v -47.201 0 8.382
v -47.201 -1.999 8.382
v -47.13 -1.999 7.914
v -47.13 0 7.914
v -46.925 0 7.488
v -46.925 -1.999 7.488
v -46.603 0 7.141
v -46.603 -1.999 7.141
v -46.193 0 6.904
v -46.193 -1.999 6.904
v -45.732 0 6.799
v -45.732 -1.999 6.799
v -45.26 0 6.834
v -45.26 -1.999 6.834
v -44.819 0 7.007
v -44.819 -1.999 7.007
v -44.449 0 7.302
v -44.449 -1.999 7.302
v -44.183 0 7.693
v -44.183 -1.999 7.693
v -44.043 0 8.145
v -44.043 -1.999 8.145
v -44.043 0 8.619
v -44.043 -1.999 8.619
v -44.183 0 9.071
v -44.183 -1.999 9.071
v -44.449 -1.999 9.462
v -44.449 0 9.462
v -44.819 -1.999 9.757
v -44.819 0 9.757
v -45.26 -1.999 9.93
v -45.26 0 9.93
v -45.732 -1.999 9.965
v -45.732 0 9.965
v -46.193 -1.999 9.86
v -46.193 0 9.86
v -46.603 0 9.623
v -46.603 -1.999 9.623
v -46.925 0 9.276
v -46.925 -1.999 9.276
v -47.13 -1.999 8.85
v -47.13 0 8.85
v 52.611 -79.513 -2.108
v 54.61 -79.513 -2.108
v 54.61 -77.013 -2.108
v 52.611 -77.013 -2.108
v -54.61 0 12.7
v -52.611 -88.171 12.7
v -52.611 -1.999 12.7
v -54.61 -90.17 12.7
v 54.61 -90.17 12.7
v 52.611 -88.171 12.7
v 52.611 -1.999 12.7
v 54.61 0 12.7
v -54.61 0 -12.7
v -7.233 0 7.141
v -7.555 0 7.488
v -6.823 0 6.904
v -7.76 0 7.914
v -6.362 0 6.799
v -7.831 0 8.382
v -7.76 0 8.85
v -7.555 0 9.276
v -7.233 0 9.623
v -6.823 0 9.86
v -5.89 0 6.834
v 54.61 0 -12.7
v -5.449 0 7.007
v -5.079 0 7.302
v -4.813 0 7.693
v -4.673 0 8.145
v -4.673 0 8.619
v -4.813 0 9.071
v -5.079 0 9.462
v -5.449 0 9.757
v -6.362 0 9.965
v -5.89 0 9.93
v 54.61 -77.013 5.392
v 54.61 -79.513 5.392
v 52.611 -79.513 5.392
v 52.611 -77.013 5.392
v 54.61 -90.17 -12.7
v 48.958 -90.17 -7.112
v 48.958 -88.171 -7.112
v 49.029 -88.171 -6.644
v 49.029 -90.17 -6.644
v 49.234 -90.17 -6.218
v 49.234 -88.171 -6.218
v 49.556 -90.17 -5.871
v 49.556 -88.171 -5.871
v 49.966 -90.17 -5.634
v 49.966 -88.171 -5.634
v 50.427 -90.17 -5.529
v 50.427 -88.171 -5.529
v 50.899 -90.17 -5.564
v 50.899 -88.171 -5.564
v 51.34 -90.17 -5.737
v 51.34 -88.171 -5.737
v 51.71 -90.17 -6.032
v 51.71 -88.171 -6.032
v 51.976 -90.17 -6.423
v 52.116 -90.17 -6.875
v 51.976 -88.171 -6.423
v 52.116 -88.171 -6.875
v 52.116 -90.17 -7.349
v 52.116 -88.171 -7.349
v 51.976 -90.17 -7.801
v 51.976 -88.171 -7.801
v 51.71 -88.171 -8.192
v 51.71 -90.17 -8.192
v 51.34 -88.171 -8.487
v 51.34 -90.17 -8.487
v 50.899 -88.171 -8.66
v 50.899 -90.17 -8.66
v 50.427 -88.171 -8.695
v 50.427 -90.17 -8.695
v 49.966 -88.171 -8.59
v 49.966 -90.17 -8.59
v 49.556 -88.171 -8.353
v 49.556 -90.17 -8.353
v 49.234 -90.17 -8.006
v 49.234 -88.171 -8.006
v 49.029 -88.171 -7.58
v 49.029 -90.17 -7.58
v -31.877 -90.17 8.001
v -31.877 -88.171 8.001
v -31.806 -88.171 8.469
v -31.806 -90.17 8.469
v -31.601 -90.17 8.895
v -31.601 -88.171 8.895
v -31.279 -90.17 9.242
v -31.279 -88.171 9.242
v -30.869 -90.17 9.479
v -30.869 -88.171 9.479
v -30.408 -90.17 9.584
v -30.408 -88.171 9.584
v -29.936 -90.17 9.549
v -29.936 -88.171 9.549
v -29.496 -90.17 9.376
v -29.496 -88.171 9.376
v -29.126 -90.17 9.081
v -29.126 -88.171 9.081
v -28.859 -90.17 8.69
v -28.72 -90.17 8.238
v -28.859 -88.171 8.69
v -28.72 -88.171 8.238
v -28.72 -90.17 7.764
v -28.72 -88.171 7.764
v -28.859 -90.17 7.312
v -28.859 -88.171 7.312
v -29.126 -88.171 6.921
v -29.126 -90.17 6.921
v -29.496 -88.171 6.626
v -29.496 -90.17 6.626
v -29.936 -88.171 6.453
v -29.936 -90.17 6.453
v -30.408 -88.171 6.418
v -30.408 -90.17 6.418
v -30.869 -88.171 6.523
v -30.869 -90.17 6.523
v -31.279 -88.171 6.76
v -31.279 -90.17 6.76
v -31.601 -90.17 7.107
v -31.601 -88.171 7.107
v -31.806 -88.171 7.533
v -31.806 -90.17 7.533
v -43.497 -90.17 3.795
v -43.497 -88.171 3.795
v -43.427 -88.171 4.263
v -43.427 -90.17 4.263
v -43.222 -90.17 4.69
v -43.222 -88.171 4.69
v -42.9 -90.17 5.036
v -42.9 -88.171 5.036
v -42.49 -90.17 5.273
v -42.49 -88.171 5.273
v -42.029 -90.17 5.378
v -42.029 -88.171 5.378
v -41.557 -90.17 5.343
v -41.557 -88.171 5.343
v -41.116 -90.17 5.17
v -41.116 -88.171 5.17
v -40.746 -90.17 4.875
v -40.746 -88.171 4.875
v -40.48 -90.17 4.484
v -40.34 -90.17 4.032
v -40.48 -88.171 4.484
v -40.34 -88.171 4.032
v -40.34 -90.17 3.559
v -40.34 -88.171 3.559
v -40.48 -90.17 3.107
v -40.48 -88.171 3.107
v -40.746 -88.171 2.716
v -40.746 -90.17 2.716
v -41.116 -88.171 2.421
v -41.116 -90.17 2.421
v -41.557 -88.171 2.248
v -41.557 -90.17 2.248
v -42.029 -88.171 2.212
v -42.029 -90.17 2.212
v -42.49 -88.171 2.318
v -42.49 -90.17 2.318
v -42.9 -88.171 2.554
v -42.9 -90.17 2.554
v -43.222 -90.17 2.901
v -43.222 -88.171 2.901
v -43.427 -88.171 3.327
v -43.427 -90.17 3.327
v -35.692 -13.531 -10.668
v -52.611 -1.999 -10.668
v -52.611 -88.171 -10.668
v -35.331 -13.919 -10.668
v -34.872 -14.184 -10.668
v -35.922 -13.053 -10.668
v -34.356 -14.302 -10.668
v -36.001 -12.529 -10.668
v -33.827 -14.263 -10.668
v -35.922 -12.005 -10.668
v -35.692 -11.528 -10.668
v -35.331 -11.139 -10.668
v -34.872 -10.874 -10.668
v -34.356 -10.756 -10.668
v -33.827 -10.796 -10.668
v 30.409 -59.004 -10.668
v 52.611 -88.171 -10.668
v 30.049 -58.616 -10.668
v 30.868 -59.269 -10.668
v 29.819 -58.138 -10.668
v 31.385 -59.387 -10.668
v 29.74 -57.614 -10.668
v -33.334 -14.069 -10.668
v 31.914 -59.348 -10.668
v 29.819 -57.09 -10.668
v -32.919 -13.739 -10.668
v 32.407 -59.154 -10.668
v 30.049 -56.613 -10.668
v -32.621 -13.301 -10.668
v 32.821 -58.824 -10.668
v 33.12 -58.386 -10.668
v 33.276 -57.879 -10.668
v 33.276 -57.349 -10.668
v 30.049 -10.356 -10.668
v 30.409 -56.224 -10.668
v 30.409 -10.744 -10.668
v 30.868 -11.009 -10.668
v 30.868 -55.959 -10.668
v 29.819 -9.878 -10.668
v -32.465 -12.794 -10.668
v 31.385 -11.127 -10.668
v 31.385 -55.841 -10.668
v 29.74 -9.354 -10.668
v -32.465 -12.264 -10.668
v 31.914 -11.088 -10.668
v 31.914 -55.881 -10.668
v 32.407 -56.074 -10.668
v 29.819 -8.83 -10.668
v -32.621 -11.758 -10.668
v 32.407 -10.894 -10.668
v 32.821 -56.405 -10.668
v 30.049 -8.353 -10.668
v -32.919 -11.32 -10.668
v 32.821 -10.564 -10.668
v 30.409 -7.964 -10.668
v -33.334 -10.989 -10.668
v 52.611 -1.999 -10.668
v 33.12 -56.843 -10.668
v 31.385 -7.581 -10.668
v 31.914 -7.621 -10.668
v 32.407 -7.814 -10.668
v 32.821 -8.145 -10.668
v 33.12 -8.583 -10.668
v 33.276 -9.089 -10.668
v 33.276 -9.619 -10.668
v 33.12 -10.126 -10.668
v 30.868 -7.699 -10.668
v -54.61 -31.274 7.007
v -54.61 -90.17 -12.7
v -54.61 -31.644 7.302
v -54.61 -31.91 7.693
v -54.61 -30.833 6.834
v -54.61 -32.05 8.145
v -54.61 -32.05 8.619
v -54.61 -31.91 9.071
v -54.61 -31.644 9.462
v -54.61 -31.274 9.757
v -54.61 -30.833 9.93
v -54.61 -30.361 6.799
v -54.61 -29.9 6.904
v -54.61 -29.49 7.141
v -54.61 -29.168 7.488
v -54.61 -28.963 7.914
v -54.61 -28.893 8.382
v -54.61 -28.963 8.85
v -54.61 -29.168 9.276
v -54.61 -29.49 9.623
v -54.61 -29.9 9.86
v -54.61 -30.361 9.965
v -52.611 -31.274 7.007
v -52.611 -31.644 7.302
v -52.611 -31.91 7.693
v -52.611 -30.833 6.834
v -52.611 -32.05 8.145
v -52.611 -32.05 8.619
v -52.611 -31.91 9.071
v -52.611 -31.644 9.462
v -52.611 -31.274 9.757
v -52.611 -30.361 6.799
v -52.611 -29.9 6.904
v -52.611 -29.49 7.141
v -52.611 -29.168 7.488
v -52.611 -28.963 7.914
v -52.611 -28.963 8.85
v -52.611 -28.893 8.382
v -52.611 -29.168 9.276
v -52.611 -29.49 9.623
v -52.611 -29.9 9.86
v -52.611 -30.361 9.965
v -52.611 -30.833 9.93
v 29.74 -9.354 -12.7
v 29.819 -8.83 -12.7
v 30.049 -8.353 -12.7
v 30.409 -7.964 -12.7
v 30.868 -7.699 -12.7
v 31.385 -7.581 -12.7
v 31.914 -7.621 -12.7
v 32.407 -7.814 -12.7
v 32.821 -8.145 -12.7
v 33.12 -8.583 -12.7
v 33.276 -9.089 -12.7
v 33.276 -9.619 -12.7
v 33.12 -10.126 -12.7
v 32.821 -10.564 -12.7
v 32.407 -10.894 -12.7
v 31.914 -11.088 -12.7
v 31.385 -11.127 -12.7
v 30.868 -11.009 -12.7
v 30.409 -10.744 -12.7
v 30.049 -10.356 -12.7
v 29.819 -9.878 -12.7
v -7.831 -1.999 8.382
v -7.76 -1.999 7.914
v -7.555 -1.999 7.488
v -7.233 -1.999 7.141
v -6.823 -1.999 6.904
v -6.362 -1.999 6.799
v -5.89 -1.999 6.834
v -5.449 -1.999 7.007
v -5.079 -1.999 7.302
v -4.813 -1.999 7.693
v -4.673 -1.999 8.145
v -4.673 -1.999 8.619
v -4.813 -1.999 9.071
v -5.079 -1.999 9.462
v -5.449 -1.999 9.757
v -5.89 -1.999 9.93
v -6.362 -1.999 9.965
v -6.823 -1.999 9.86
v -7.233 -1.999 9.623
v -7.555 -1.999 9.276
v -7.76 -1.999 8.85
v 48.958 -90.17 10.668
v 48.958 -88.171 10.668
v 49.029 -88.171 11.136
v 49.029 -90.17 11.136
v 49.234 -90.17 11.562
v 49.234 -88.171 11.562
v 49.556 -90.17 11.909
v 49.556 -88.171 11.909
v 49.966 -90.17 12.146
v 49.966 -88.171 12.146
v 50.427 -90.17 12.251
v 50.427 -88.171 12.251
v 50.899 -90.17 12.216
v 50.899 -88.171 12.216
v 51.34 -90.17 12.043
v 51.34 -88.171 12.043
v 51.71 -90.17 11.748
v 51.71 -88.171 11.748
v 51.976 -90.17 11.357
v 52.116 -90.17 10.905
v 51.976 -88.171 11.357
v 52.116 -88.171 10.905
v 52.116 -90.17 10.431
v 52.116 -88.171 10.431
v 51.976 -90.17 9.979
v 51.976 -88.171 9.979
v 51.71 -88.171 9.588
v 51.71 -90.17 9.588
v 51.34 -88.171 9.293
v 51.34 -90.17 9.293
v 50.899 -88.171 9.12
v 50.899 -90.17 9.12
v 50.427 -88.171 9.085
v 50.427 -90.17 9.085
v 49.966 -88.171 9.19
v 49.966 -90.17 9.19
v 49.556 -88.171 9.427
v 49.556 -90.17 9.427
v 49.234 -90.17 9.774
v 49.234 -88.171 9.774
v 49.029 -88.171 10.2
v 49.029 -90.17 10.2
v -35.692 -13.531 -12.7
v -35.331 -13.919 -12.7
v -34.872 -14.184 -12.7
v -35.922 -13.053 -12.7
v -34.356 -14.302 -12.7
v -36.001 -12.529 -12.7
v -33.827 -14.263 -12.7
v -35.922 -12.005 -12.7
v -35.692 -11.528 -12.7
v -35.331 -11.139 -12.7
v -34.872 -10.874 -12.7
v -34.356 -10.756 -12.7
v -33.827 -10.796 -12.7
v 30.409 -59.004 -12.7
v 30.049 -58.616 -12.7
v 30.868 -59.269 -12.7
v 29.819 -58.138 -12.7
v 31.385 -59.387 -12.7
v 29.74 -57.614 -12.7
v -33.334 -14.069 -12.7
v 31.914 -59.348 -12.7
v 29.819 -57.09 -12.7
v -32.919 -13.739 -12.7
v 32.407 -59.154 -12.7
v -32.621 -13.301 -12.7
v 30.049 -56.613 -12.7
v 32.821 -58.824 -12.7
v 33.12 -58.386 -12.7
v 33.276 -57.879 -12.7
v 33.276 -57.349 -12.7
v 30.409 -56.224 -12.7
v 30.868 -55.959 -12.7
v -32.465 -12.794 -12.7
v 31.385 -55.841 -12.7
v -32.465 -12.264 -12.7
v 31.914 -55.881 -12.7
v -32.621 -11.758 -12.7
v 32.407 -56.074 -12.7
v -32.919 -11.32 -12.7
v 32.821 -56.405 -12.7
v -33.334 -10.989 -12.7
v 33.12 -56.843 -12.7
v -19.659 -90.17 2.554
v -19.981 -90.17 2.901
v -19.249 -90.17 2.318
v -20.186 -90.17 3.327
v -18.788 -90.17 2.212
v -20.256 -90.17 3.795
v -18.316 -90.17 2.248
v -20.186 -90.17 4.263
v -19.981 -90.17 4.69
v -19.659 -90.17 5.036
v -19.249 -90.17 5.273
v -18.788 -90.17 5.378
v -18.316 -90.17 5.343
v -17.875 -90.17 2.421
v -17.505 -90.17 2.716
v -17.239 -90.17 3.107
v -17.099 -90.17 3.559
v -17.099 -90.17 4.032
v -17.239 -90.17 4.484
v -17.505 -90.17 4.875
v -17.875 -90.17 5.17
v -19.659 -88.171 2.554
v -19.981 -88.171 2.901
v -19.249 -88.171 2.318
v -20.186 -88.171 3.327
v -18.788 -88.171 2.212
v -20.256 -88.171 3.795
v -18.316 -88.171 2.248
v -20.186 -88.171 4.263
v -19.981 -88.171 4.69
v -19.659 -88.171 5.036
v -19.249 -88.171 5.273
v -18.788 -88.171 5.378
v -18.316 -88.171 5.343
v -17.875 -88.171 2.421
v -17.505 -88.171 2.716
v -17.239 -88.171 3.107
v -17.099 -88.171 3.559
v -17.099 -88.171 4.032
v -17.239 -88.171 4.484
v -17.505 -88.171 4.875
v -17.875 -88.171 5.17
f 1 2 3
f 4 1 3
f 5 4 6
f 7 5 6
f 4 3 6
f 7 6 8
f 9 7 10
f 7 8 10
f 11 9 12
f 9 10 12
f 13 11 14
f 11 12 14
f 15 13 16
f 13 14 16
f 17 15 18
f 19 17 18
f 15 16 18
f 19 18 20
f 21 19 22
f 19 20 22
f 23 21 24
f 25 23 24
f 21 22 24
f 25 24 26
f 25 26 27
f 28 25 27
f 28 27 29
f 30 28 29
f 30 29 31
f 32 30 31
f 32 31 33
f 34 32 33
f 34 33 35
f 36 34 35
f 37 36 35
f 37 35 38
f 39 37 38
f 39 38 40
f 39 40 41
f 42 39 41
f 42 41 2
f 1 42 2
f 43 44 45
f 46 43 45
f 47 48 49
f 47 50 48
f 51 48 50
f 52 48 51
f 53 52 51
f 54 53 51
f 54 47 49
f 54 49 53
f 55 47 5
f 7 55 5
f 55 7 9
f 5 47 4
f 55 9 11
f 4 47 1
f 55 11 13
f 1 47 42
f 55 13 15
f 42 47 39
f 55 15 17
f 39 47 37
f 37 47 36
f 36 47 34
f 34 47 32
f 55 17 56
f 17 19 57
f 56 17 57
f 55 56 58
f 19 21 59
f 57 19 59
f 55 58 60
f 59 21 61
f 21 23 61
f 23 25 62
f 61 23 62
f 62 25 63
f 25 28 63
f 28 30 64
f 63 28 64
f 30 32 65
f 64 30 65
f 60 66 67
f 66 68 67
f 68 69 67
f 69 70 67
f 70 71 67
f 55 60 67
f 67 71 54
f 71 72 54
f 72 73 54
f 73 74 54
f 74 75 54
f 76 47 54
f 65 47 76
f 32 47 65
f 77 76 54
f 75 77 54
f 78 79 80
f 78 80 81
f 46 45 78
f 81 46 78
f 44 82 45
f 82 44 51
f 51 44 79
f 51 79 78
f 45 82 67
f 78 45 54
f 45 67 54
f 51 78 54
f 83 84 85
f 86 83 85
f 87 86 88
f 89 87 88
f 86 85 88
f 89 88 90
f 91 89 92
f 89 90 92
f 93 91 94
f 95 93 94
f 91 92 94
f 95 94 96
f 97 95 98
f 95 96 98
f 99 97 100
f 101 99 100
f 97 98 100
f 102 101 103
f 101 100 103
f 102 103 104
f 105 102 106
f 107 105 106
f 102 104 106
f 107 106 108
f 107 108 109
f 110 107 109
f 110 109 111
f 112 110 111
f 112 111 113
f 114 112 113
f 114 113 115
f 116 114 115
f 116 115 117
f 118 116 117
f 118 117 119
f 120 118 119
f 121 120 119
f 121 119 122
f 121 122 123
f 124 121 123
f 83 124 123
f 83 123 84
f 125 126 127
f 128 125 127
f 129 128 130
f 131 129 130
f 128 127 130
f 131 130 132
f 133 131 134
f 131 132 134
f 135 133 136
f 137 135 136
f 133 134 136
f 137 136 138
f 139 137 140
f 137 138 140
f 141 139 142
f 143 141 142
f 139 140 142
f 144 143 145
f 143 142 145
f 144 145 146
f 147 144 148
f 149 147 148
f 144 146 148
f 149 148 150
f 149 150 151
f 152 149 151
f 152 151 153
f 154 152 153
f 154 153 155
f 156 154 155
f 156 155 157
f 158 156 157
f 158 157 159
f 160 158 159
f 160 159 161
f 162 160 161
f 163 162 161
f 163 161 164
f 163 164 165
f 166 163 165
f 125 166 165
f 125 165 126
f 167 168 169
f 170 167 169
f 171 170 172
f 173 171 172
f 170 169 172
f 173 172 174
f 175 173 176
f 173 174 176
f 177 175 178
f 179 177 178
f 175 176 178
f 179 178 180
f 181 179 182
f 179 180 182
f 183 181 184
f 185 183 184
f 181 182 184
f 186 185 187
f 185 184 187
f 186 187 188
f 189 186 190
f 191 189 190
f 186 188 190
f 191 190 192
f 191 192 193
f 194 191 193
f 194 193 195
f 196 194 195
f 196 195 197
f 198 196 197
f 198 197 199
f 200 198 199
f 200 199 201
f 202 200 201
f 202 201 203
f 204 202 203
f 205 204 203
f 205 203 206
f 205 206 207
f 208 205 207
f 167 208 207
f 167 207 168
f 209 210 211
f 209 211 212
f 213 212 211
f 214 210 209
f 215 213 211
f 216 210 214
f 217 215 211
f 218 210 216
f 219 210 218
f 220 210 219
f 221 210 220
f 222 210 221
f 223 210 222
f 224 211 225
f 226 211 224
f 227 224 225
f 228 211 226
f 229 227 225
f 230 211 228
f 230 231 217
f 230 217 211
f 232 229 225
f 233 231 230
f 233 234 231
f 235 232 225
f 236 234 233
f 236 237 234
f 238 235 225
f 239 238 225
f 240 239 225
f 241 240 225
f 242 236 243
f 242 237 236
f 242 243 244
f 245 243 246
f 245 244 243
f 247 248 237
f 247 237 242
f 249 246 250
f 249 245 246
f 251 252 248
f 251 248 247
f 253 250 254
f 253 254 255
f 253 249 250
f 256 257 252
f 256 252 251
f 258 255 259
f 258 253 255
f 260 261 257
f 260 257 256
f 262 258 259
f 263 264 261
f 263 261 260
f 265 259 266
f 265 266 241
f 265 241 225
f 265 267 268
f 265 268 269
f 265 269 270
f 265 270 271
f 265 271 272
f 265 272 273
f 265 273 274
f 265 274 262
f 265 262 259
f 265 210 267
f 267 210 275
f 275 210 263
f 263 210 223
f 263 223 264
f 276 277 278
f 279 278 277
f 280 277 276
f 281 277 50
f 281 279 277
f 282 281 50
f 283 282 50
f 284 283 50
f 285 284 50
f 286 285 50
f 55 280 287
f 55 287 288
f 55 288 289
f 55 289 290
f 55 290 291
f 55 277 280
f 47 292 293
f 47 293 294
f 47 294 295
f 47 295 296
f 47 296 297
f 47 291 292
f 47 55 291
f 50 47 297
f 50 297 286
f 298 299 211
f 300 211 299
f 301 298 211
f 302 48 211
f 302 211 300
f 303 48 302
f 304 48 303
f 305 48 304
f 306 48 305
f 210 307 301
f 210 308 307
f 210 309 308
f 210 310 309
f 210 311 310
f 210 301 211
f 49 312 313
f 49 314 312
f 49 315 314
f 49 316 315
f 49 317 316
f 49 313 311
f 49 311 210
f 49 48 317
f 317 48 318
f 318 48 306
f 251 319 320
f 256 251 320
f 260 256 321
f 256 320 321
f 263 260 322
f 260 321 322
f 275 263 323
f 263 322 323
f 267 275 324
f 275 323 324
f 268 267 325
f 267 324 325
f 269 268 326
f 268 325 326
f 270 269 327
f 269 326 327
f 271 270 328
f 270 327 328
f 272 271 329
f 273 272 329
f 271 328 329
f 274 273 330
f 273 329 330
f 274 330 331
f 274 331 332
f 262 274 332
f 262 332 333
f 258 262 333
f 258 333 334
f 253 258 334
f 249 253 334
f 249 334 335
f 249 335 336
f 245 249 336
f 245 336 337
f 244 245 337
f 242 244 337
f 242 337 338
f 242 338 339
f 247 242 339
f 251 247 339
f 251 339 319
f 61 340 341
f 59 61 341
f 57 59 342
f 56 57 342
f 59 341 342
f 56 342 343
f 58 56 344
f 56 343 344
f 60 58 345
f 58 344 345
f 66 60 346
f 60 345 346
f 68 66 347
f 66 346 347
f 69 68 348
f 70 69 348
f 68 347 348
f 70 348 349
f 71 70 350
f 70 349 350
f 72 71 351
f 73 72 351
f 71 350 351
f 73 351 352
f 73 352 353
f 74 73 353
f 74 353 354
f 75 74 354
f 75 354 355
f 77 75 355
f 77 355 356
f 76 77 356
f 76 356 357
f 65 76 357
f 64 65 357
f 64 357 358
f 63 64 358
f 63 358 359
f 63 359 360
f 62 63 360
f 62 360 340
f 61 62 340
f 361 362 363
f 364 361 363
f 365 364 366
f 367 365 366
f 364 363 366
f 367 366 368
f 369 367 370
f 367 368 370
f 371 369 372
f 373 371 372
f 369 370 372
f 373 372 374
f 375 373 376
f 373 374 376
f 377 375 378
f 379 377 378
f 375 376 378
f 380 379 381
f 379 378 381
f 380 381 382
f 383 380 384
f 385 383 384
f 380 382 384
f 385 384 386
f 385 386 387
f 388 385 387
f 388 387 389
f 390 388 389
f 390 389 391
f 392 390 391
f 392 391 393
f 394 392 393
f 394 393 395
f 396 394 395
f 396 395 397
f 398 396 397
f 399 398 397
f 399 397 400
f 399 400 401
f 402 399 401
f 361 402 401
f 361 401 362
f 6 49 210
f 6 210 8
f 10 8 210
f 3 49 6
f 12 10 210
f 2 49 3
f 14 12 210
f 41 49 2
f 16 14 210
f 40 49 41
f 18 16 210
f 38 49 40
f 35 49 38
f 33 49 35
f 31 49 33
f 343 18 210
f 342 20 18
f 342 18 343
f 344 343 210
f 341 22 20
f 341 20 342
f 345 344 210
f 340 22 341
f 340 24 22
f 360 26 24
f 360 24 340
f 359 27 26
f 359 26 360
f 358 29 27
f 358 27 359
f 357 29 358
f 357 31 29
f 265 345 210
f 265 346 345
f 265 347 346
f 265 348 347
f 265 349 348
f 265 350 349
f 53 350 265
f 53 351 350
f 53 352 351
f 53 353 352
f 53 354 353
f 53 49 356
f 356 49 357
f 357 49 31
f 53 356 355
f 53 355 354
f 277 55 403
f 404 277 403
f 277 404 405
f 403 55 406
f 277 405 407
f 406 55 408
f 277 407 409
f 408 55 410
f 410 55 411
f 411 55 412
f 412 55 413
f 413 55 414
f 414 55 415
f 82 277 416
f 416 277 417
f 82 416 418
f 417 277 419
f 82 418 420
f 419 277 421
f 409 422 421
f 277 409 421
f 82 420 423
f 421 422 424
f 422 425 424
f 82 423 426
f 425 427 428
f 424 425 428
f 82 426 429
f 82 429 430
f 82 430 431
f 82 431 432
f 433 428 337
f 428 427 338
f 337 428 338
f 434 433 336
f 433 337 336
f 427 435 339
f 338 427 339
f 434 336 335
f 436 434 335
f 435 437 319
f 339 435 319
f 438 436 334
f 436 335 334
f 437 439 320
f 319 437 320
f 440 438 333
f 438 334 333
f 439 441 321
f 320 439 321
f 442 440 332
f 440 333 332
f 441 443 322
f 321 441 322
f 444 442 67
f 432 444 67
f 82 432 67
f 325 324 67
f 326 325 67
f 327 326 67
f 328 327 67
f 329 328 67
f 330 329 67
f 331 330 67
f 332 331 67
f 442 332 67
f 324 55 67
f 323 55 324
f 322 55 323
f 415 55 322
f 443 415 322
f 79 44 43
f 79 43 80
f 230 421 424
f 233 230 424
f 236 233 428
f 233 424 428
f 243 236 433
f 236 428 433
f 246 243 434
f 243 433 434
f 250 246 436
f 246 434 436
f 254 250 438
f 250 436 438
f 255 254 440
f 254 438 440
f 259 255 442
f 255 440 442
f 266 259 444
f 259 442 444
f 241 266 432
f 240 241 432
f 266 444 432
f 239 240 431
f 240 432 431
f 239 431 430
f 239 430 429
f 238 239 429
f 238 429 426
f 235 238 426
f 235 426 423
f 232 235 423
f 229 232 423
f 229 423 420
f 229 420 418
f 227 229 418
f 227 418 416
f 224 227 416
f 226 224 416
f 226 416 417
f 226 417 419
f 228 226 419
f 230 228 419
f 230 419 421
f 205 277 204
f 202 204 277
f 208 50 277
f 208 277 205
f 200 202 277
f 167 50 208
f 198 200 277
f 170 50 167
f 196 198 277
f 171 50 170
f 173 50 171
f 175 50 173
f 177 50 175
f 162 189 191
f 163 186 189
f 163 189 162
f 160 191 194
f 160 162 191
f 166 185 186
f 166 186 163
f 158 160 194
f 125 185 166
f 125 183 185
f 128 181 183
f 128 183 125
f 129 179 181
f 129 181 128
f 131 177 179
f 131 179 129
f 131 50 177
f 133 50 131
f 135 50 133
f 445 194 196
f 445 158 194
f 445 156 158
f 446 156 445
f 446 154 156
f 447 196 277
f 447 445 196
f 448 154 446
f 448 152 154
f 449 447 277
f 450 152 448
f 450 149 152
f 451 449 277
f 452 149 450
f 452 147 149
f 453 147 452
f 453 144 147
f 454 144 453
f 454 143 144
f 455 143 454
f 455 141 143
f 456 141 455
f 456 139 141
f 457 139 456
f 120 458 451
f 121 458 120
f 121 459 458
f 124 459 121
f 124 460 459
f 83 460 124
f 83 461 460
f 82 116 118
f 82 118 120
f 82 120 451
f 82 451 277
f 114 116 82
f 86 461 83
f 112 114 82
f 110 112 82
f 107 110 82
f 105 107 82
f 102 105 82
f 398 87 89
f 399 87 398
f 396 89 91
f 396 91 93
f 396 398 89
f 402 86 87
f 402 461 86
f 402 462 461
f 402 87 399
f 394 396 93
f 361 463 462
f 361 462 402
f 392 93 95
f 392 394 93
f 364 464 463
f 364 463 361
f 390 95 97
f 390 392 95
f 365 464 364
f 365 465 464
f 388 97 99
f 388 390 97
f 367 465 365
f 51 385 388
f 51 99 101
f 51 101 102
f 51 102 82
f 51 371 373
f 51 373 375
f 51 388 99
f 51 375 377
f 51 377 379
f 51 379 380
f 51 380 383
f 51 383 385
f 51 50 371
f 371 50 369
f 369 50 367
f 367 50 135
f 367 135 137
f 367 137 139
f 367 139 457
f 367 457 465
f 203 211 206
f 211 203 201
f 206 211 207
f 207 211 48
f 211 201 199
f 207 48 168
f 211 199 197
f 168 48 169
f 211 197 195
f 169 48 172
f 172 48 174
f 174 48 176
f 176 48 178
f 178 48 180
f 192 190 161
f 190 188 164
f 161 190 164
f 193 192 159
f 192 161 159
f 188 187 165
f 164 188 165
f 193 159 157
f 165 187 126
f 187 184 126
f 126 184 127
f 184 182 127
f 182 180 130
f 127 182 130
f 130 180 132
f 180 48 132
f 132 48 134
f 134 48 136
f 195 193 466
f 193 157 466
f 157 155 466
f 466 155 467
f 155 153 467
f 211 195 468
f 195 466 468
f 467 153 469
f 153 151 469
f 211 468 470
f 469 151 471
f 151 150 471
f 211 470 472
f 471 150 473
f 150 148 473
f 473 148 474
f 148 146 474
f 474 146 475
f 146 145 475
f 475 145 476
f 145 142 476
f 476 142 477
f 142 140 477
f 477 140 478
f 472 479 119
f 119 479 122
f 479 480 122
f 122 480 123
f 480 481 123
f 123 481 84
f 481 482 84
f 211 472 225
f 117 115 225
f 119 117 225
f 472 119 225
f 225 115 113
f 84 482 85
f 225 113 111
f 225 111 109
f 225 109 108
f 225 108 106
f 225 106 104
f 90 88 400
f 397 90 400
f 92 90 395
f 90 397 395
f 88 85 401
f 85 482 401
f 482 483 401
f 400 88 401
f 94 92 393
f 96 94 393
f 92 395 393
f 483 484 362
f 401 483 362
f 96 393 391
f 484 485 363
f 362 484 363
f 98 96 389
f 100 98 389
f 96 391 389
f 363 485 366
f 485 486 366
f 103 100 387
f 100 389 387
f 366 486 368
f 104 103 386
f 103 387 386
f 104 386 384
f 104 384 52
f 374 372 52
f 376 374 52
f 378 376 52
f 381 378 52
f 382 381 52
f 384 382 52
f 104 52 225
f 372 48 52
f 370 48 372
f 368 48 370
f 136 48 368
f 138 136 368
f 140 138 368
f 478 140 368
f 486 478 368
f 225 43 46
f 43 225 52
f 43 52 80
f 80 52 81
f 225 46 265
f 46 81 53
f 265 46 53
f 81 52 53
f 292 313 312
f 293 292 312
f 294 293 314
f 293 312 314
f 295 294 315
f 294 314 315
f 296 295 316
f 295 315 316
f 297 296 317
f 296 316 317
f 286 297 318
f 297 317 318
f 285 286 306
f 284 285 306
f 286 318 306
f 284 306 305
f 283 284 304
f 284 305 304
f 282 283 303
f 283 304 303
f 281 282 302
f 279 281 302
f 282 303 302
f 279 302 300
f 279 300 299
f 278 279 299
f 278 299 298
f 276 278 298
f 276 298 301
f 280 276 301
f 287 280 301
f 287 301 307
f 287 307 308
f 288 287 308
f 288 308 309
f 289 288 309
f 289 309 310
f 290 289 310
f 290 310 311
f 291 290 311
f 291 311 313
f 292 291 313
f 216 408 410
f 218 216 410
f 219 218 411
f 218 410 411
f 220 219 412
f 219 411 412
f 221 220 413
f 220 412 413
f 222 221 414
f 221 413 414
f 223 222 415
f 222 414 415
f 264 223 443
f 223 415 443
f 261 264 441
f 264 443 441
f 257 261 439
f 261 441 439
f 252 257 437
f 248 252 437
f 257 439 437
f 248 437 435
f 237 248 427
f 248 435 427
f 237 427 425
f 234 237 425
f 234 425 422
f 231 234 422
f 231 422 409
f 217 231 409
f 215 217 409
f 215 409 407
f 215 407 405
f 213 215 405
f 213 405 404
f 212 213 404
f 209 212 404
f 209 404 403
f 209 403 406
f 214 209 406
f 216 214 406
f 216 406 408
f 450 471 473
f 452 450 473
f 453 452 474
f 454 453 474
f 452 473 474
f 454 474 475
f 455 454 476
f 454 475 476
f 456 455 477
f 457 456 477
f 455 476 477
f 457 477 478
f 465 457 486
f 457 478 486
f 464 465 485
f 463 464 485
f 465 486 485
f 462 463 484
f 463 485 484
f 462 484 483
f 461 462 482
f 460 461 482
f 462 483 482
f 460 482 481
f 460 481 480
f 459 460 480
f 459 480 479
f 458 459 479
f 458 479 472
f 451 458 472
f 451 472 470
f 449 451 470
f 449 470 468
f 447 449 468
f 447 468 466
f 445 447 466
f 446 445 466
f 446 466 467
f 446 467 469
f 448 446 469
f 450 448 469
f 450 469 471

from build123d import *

# Parameters (mm, degrees)
F0_W      = 109.22
F0_H      = 25.4
F1_DEPTH  = 90.17
F2_W      = 105.22204
F2_H      = 86.17204
F3_DEPTH  = 23.368
F6_D      = 3.556
F10_R     = 2.7904831324
F11_DEPTH = 25.4
F13_D     = 3.175
F13_DEPTH = 12.7
F13_TIP   = 0.9538662327
F14_W     = 2.5
F14_H     = 7.5
F15_DEPTH = 5.08
F17_D     = 3.175
F17_DEPTH = 12.7
F17_TIP   = 0.9538662327
F19_D     = 3.175
F19_DEPTH = 12.7
F19_TIP   = 0.9538662327
F21_D     = 3.175
F21_DEPTH = 12.7
F21_TIP   = 0.9538662327


# Not quite as in the source:
# - a feature of the source that left no trace in its solid (it failed there, or was rolled back) is left out
# - a feature names something its author has since deleted; it is built from what else it names


with BuildPart() as f1:
    # F0 (on Front) → F1 (new body)
    with BuildSketch(Plane.XZ):
        Rectangle(F0_W, F0_H)
    extrude(amount=F1_DEPTH)

    # F2 (on face) → F3 (cut)
    with BuildSketch(Plane.XY.offset(12.7)):
        with Locations((0, -45.085)):
            Rectangle(F2_W, F2_H)
    extrude(amount=-F3_DEPTH, mode=Mode.SUBTRACT)

    # F6 (through all)
    with Locations(Plane.XY.offset(-10.668)):
        with Locations((-34.2227290702, -12.5292580739), (31.5179094365, -9.3542580739), (31.5179094365, -57.6142580739)):
            Hole(F6_D / 2)

    # F10 (on face) → F11 (cut)
    with BuildSketch(Plane(origin=(0, 0, -12.7), x_dir=(1, 0, 0), z_dir=(0, 0, -1))):
        with Locations((-37.1684581041, 13.9195527881)):
            Circle(F10_R)
    extrude(amount=F11_DEPTH, mode=Mode.SUBTRACT)

    # F13
    with Locations(Plane.XZ.offset(90.17)):
        with Locations((50.546, 10.668), (50.546, -7.112)):
            Hole(F13_D / 2, depth=F13_DEPTH)
            with Locations((0, 0, -(F13_DEPTH + F13_TIP / 2))):  # 118° drill point
                Cone(0, F13_D / 2, F13_TIP, mode=Mode.SUBTRACT)

    # F14 (on face) → F15 (cut)
    with BuildSketch(Plane.YZ.offset(54.61)):
        with Locations((-78.2630409374, 1.6418104)):
            Rectangle(F14_W, F14_H)
    extrude(amount=-F15_DEPTH, mode=Mode.SUBTRACT)

    # F17
    with Locations(Plane(origin=(0, 0, 0), x_dir=(1, 0, 0), z_dir=(0, 1, 0))):
        with Locations((-6.2431572373, -8.382), (-45.6131572373, -8.382)):
            Hole(F17_D / 2, depth=F17_DEPTH)
            with Locations((0, 0, -(F17_DEPTH + F17_TIP / 2))):  # 118° drill point
                Cone(0, F17_D / 2, F17_TIP, mode=Mode.SUBTRACT)

    # F19
    with Locations(Plane(origin=(-54.61, 0, 0), x_dir=(0, -1, 0), z_dir=(-1, 0, 0))):
        with Locations((30.48, 8.382)):
            Hole(F19_D / 2, depth=F19_DEPTH)
            with Locations((0, 0, -(F19_DEPTH + F19_TIP / 2))):  # 118° drill point
                Cone(0, F19_D / 2, F19_TIP, mode=Mode.SUBTRACT)

    # F21
    with Locations(Plane.XZ.offset(90.17)):
        with Locations((-30.2895, 8.001), (-41.91, 3.7953188), (-18.669, 3.7953188)):
            Hole(F21_D / 2, depth=F21_DEPTH)
            with Locations((0, 0, -(F21_DEPTH + F21_TIP / 2))):  # 118° drill point
                Cone(0, F21_D / 2, F21_TIP, mode=Mode.SUBTRACT)


solid = f1.part
